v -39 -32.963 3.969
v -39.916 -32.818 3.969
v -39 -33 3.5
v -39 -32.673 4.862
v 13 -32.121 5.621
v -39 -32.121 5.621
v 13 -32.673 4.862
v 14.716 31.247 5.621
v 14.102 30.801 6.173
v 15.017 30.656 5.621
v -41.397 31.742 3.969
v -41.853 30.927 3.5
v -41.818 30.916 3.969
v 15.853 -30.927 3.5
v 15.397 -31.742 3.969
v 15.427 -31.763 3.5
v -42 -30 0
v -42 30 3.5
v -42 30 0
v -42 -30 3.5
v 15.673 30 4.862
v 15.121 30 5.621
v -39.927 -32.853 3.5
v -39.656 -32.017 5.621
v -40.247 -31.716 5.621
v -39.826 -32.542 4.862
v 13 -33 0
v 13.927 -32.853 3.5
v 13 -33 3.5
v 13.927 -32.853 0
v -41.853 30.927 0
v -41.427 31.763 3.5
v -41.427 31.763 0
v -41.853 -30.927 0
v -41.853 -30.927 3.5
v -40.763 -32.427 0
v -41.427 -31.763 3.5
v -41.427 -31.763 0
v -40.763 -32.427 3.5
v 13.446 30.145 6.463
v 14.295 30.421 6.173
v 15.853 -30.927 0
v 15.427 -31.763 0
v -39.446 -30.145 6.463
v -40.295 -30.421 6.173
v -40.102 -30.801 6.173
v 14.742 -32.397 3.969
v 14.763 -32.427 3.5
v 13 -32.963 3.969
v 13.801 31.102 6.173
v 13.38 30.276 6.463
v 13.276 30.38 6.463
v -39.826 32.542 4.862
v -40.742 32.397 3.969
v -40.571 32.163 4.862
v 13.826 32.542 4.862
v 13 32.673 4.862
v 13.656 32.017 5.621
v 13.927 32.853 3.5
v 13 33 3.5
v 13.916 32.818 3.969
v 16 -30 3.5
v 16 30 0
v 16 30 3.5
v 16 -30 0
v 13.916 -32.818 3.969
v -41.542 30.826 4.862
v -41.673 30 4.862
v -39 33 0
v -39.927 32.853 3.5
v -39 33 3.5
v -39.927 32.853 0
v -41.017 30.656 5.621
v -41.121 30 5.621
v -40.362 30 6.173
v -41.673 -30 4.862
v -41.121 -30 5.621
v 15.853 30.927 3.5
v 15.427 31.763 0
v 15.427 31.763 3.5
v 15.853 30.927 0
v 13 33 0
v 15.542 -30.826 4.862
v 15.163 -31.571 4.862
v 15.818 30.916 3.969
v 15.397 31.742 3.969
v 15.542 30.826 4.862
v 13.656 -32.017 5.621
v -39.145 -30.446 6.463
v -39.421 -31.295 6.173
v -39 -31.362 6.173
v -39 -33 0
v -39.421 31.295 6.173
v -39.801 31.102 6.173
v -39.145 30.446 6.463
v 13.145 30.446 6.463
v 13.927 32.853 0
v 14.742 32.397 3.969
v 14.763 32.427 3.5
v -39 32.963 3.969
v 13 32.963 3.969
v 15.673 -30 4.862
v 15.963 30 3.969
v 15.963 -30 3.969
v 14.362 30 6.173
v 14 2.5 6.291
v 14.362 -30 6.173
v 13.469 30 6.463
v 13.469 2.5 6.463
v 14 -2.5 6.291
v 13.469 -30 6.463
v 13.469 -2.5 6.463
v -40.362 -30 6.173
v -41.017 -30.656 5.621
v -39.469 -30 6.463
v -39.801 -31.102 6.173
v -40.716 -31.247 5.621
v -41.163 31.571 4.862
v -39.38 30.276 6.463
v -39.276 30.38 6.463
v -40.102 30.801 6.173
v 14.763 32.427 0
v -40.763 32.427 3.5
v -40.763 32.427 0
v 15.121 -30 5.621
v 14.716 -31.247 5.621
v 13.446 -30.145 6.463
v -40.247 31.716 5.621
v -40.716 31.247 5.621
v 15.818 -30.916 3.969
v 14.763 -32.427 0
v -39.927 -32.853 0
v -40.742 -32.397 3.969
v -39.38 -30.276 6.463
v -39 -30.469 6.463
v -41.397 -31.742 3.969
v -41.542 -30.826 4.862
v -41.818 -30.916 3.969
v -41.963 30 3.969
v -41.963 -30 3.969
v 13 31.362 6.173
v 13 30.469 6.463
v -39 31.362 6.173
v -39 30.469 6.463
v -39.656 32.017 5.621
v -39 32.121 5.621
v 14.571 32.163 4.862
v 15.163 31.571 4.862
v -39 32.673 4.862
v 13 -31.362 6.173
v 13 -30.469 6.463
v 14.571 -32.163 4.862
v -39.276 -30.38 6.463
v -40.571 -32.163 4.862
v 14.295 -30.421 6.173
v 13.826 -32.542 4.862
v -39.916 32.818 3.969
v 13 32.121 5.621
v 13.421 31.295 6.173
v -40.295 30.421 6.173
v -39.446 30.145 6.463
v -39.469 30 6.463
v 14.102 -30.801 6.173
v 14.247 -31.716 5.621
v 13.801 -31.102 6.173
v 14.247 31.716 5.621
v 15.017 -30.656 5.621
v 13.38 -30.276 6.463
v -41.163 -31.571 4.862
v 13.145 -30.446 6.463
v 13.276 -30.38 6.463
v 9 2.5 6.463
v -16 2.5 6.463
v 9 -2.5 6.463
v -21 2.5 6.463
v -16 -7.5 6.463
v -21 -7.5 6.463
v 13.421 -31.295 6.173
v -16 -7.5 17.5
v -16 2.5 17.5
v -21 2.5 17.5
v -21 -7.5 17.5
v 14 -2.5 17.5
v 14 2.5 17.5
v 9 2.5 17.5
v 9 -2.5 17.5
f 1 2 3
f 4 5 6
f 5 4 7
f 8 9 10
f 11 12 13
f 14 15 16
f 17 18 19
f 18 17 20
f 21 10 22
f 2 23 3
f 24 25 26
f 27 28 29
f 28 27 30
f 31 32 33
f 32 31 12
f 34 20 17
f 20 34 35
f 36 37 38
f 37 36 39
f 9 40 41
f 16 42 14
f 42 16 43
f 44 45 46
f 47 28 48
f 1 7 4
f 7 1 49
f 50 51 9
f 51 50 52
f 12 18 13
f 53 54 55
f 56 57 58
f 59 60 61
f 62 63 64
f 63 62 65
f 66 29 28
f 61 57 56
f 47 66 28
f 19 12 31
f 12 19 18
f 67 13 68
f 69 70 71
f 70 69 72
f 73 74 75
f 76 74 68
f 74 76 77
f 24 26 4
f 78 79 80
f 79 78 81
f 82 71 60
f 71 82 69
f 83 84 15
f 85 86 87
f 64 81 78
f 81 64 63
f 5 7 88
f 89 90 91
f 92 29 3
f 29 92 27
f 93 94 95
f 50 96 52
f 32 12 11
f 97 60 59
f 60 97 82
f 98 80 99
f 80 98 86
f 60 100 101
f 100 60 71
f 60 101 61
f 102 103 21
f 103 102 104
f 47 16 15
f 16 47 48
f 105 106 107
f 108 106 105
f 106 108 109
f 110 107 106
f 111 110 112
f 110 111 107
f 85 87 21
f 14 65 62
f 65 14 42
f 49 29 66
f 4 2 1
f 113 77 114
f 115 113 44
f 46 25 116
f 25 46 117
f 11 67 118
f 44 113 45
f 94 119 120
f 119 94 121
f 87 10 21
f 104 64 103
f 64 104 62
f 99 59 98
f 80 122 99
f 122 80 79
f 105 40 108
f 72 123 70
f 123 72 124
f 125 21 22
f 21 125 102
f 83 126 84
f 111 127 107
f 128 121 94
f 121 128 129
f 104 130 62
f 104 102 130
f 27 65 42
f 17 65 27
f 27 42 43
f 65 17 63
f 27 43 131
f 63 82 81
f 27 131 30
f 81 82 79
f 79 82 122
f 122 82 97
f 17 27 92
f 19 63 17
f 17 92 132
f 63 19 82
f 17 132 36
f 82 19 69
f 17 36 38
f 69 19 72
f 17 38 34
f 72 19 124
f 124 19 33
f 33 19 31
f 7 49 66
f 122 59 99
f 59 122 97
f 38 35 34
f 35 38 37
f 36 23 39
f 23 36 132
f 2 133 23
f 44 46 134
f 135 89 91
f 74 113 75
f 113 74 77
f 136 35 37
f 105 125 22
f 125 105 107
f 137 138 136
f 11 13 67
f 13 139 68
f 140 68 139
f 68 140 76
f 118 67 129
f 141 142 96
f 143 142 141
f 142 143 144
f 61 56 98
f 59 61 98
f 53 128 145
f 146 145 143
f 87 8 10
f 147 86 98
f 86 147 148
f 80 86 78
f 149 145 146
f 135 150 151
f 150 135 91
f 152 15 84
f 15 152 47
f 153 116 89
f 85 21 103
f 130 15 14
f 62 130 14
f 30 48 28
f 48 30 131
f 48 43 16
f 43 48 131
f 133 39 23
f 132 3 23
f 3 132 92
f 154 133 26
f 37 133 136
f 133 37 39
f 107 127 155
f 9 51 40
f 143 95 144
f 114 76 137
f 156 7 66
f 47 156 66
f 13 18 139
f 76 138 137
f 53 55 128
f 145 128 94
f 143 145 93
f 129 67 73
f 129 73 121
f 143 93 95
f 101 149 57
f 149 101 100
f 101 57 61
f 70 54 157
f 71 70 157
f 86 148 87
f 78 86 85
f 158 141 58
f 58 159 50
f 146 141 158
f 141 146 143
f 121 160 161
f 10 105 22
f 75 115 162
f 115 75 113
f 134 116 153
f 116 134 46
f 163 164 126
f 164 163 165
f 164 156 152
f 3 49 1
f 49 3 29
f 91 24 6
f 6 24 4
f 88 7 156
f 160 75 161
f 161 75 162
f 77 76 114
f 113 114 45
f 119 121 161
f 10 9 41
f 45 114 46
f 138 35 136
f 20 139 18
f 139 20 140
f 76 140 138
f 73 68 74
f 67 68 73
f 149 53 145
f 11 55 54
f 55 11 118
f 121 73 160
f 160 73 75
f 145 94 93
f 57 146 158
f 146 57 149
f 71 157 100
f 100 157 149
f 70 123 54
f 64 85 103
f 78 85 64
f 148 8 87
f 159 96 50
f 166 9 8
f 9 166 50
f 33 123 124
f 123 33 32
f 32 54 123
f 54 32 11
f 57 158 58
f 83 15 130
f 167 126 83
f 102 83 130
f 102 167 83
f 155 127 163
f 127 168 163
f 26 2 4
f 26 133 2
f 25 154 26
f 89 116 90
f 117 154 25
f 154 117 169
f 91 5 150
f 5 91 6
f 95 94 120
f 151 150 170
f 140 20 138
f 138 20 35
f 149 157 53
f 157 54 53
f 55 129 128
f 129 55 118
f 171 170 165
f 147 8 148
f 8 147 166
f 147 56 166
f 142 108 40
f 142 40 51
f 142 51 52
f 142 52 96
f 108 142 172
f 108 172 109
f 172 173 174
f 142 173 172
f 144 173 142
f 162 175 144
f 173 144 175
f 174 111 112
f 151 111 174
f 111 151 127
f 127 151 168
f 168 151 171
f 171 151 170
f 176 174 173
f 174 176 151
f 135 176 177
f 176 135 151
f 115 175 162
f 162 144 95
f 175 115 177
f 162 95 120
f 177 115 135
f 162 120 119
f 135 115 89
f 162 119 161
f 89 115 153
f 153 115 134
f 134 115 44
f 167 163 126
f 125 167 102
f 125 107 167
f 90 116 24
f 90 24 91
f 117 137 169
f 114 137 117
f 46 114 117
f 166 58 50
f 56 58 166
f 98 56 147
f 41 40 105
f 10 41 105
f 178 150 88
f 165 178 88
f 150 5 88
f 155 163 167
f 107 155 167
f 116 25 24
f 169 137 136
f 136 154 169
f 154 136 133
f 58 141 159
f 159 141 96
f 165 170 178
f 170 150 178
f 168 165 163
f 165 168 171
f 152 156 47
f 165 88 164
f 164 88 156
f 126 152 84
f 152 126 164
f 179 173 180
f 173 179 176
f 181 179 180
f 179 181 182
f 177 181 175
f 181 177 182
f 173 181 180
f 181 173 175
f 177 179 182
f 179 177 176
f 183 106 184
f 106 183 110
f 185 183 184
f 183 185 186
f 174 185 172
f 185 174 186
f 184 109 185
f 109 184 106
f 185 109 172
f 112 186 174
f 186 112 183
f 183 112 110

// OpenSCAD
//Medidas de la base de la pieza original:
xBase = 52;
yBase = 60;
//La coordenada Z la separamos en el valor recto(altura cilindro) y el valor de la curva(radio esfera)
hCilindro = 3.5;
rEsfera = 3;
zBase = hCilindro + rEsfera;

//Medidas del saliente mayor de la base
xCubMay = 5;
yCubMay = 10;
zCubMay = 11;

//Medidas del saliente menor de la base
xCubMen = 5;
yCubMen = xCubMen;
zCubMen = zCubMay;

fn = 20;

hull(){

    translate([-3/4*xBase,-yBase/2,0])union () {
        translate([0,0,hCilindro])
        sphere(r=rEsfera, $fn=fn);
        cylinder (r=rEsfera, h=hCilindro, $fn=fn);
   }
   translate([xBase/4,yBase/2,0])union () {
        translate([0,0,hCilindro])
        sphere(r=rEsfera, $fn=fn);
        cylinder (r=rEsfera, h=hCilindro, $fn=fn);
   }
   translate([xBase/4,-yBase/2,0])union () {
        translate([0,0,hCilindro])
        sphere(r=rEsfera, $fn=fn);
        cylinder (r=rEsfera, h=hCilindro, $fn=fn);
   }
   translate([-3/4*xBase,yBase/2,0])union () {
        translate([0,0,hCilindro])
        sphere(r=rEsfera, $fn=fn);
        cylinder (r=rEsfera, h=hCilindro, $fn=fn);
   }
}


translate ([-21,-7.5,zBase-2])
cube([xCubMay,yCubMay,zCubMay+2]);

translate ([9,-2.5,zBase-2])
cube([xCubMen,yCubMen,zCubMen+2]);
